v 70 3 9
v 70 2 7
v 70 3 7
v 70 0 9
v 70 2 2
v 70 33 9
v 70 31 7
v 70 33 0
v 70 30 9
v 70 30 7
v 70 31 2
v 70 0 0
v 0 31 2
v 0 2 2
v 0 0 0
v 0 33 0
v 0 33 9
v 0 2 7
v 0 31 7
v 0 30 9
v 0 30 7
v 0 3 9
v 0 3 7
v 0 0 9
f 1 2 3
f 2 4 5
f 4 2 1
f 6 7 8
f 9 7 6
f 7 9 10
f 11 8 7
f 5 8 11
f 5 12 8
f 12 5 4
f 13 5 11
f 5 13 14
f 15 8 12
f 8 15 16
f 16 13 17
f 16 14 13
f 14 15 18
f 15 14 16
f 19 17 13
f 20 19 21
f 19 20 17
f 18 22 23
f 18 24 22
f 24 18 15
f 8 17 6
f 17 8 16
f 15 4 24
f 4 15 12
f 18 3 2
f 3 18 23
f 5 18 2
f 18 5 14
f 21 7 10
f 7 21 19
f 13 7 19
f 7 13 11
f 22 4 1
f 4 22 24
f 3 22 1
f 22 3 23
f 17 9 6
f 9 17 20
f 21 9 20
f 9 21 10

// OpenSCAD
/*
 * A shelf label that clips onto a set of metal shelves.
 */

Width = 70;
Height = 29;
Depth = 5;
Thickness = 2;
Overhang = 1;

cube([Width, Height + 2 * Thickness, Thickness]);
translate([0, 0, Thickness]) {
  cube([Width, Thickness, Depth]);
}
translate([0, Height + Thickness, Thickness]) {
  cube([Width, Thickness, Depth]);
}
translate([0, 0, Thickness + Depth]) {
  cube([Width, Thickness + Overhang, Thickness]);
}
translate([0, Height + Thickness - Overhang, Thickness + Depth]) {
  cube([Width, Thickness + Overhang, Thickness]);
}
